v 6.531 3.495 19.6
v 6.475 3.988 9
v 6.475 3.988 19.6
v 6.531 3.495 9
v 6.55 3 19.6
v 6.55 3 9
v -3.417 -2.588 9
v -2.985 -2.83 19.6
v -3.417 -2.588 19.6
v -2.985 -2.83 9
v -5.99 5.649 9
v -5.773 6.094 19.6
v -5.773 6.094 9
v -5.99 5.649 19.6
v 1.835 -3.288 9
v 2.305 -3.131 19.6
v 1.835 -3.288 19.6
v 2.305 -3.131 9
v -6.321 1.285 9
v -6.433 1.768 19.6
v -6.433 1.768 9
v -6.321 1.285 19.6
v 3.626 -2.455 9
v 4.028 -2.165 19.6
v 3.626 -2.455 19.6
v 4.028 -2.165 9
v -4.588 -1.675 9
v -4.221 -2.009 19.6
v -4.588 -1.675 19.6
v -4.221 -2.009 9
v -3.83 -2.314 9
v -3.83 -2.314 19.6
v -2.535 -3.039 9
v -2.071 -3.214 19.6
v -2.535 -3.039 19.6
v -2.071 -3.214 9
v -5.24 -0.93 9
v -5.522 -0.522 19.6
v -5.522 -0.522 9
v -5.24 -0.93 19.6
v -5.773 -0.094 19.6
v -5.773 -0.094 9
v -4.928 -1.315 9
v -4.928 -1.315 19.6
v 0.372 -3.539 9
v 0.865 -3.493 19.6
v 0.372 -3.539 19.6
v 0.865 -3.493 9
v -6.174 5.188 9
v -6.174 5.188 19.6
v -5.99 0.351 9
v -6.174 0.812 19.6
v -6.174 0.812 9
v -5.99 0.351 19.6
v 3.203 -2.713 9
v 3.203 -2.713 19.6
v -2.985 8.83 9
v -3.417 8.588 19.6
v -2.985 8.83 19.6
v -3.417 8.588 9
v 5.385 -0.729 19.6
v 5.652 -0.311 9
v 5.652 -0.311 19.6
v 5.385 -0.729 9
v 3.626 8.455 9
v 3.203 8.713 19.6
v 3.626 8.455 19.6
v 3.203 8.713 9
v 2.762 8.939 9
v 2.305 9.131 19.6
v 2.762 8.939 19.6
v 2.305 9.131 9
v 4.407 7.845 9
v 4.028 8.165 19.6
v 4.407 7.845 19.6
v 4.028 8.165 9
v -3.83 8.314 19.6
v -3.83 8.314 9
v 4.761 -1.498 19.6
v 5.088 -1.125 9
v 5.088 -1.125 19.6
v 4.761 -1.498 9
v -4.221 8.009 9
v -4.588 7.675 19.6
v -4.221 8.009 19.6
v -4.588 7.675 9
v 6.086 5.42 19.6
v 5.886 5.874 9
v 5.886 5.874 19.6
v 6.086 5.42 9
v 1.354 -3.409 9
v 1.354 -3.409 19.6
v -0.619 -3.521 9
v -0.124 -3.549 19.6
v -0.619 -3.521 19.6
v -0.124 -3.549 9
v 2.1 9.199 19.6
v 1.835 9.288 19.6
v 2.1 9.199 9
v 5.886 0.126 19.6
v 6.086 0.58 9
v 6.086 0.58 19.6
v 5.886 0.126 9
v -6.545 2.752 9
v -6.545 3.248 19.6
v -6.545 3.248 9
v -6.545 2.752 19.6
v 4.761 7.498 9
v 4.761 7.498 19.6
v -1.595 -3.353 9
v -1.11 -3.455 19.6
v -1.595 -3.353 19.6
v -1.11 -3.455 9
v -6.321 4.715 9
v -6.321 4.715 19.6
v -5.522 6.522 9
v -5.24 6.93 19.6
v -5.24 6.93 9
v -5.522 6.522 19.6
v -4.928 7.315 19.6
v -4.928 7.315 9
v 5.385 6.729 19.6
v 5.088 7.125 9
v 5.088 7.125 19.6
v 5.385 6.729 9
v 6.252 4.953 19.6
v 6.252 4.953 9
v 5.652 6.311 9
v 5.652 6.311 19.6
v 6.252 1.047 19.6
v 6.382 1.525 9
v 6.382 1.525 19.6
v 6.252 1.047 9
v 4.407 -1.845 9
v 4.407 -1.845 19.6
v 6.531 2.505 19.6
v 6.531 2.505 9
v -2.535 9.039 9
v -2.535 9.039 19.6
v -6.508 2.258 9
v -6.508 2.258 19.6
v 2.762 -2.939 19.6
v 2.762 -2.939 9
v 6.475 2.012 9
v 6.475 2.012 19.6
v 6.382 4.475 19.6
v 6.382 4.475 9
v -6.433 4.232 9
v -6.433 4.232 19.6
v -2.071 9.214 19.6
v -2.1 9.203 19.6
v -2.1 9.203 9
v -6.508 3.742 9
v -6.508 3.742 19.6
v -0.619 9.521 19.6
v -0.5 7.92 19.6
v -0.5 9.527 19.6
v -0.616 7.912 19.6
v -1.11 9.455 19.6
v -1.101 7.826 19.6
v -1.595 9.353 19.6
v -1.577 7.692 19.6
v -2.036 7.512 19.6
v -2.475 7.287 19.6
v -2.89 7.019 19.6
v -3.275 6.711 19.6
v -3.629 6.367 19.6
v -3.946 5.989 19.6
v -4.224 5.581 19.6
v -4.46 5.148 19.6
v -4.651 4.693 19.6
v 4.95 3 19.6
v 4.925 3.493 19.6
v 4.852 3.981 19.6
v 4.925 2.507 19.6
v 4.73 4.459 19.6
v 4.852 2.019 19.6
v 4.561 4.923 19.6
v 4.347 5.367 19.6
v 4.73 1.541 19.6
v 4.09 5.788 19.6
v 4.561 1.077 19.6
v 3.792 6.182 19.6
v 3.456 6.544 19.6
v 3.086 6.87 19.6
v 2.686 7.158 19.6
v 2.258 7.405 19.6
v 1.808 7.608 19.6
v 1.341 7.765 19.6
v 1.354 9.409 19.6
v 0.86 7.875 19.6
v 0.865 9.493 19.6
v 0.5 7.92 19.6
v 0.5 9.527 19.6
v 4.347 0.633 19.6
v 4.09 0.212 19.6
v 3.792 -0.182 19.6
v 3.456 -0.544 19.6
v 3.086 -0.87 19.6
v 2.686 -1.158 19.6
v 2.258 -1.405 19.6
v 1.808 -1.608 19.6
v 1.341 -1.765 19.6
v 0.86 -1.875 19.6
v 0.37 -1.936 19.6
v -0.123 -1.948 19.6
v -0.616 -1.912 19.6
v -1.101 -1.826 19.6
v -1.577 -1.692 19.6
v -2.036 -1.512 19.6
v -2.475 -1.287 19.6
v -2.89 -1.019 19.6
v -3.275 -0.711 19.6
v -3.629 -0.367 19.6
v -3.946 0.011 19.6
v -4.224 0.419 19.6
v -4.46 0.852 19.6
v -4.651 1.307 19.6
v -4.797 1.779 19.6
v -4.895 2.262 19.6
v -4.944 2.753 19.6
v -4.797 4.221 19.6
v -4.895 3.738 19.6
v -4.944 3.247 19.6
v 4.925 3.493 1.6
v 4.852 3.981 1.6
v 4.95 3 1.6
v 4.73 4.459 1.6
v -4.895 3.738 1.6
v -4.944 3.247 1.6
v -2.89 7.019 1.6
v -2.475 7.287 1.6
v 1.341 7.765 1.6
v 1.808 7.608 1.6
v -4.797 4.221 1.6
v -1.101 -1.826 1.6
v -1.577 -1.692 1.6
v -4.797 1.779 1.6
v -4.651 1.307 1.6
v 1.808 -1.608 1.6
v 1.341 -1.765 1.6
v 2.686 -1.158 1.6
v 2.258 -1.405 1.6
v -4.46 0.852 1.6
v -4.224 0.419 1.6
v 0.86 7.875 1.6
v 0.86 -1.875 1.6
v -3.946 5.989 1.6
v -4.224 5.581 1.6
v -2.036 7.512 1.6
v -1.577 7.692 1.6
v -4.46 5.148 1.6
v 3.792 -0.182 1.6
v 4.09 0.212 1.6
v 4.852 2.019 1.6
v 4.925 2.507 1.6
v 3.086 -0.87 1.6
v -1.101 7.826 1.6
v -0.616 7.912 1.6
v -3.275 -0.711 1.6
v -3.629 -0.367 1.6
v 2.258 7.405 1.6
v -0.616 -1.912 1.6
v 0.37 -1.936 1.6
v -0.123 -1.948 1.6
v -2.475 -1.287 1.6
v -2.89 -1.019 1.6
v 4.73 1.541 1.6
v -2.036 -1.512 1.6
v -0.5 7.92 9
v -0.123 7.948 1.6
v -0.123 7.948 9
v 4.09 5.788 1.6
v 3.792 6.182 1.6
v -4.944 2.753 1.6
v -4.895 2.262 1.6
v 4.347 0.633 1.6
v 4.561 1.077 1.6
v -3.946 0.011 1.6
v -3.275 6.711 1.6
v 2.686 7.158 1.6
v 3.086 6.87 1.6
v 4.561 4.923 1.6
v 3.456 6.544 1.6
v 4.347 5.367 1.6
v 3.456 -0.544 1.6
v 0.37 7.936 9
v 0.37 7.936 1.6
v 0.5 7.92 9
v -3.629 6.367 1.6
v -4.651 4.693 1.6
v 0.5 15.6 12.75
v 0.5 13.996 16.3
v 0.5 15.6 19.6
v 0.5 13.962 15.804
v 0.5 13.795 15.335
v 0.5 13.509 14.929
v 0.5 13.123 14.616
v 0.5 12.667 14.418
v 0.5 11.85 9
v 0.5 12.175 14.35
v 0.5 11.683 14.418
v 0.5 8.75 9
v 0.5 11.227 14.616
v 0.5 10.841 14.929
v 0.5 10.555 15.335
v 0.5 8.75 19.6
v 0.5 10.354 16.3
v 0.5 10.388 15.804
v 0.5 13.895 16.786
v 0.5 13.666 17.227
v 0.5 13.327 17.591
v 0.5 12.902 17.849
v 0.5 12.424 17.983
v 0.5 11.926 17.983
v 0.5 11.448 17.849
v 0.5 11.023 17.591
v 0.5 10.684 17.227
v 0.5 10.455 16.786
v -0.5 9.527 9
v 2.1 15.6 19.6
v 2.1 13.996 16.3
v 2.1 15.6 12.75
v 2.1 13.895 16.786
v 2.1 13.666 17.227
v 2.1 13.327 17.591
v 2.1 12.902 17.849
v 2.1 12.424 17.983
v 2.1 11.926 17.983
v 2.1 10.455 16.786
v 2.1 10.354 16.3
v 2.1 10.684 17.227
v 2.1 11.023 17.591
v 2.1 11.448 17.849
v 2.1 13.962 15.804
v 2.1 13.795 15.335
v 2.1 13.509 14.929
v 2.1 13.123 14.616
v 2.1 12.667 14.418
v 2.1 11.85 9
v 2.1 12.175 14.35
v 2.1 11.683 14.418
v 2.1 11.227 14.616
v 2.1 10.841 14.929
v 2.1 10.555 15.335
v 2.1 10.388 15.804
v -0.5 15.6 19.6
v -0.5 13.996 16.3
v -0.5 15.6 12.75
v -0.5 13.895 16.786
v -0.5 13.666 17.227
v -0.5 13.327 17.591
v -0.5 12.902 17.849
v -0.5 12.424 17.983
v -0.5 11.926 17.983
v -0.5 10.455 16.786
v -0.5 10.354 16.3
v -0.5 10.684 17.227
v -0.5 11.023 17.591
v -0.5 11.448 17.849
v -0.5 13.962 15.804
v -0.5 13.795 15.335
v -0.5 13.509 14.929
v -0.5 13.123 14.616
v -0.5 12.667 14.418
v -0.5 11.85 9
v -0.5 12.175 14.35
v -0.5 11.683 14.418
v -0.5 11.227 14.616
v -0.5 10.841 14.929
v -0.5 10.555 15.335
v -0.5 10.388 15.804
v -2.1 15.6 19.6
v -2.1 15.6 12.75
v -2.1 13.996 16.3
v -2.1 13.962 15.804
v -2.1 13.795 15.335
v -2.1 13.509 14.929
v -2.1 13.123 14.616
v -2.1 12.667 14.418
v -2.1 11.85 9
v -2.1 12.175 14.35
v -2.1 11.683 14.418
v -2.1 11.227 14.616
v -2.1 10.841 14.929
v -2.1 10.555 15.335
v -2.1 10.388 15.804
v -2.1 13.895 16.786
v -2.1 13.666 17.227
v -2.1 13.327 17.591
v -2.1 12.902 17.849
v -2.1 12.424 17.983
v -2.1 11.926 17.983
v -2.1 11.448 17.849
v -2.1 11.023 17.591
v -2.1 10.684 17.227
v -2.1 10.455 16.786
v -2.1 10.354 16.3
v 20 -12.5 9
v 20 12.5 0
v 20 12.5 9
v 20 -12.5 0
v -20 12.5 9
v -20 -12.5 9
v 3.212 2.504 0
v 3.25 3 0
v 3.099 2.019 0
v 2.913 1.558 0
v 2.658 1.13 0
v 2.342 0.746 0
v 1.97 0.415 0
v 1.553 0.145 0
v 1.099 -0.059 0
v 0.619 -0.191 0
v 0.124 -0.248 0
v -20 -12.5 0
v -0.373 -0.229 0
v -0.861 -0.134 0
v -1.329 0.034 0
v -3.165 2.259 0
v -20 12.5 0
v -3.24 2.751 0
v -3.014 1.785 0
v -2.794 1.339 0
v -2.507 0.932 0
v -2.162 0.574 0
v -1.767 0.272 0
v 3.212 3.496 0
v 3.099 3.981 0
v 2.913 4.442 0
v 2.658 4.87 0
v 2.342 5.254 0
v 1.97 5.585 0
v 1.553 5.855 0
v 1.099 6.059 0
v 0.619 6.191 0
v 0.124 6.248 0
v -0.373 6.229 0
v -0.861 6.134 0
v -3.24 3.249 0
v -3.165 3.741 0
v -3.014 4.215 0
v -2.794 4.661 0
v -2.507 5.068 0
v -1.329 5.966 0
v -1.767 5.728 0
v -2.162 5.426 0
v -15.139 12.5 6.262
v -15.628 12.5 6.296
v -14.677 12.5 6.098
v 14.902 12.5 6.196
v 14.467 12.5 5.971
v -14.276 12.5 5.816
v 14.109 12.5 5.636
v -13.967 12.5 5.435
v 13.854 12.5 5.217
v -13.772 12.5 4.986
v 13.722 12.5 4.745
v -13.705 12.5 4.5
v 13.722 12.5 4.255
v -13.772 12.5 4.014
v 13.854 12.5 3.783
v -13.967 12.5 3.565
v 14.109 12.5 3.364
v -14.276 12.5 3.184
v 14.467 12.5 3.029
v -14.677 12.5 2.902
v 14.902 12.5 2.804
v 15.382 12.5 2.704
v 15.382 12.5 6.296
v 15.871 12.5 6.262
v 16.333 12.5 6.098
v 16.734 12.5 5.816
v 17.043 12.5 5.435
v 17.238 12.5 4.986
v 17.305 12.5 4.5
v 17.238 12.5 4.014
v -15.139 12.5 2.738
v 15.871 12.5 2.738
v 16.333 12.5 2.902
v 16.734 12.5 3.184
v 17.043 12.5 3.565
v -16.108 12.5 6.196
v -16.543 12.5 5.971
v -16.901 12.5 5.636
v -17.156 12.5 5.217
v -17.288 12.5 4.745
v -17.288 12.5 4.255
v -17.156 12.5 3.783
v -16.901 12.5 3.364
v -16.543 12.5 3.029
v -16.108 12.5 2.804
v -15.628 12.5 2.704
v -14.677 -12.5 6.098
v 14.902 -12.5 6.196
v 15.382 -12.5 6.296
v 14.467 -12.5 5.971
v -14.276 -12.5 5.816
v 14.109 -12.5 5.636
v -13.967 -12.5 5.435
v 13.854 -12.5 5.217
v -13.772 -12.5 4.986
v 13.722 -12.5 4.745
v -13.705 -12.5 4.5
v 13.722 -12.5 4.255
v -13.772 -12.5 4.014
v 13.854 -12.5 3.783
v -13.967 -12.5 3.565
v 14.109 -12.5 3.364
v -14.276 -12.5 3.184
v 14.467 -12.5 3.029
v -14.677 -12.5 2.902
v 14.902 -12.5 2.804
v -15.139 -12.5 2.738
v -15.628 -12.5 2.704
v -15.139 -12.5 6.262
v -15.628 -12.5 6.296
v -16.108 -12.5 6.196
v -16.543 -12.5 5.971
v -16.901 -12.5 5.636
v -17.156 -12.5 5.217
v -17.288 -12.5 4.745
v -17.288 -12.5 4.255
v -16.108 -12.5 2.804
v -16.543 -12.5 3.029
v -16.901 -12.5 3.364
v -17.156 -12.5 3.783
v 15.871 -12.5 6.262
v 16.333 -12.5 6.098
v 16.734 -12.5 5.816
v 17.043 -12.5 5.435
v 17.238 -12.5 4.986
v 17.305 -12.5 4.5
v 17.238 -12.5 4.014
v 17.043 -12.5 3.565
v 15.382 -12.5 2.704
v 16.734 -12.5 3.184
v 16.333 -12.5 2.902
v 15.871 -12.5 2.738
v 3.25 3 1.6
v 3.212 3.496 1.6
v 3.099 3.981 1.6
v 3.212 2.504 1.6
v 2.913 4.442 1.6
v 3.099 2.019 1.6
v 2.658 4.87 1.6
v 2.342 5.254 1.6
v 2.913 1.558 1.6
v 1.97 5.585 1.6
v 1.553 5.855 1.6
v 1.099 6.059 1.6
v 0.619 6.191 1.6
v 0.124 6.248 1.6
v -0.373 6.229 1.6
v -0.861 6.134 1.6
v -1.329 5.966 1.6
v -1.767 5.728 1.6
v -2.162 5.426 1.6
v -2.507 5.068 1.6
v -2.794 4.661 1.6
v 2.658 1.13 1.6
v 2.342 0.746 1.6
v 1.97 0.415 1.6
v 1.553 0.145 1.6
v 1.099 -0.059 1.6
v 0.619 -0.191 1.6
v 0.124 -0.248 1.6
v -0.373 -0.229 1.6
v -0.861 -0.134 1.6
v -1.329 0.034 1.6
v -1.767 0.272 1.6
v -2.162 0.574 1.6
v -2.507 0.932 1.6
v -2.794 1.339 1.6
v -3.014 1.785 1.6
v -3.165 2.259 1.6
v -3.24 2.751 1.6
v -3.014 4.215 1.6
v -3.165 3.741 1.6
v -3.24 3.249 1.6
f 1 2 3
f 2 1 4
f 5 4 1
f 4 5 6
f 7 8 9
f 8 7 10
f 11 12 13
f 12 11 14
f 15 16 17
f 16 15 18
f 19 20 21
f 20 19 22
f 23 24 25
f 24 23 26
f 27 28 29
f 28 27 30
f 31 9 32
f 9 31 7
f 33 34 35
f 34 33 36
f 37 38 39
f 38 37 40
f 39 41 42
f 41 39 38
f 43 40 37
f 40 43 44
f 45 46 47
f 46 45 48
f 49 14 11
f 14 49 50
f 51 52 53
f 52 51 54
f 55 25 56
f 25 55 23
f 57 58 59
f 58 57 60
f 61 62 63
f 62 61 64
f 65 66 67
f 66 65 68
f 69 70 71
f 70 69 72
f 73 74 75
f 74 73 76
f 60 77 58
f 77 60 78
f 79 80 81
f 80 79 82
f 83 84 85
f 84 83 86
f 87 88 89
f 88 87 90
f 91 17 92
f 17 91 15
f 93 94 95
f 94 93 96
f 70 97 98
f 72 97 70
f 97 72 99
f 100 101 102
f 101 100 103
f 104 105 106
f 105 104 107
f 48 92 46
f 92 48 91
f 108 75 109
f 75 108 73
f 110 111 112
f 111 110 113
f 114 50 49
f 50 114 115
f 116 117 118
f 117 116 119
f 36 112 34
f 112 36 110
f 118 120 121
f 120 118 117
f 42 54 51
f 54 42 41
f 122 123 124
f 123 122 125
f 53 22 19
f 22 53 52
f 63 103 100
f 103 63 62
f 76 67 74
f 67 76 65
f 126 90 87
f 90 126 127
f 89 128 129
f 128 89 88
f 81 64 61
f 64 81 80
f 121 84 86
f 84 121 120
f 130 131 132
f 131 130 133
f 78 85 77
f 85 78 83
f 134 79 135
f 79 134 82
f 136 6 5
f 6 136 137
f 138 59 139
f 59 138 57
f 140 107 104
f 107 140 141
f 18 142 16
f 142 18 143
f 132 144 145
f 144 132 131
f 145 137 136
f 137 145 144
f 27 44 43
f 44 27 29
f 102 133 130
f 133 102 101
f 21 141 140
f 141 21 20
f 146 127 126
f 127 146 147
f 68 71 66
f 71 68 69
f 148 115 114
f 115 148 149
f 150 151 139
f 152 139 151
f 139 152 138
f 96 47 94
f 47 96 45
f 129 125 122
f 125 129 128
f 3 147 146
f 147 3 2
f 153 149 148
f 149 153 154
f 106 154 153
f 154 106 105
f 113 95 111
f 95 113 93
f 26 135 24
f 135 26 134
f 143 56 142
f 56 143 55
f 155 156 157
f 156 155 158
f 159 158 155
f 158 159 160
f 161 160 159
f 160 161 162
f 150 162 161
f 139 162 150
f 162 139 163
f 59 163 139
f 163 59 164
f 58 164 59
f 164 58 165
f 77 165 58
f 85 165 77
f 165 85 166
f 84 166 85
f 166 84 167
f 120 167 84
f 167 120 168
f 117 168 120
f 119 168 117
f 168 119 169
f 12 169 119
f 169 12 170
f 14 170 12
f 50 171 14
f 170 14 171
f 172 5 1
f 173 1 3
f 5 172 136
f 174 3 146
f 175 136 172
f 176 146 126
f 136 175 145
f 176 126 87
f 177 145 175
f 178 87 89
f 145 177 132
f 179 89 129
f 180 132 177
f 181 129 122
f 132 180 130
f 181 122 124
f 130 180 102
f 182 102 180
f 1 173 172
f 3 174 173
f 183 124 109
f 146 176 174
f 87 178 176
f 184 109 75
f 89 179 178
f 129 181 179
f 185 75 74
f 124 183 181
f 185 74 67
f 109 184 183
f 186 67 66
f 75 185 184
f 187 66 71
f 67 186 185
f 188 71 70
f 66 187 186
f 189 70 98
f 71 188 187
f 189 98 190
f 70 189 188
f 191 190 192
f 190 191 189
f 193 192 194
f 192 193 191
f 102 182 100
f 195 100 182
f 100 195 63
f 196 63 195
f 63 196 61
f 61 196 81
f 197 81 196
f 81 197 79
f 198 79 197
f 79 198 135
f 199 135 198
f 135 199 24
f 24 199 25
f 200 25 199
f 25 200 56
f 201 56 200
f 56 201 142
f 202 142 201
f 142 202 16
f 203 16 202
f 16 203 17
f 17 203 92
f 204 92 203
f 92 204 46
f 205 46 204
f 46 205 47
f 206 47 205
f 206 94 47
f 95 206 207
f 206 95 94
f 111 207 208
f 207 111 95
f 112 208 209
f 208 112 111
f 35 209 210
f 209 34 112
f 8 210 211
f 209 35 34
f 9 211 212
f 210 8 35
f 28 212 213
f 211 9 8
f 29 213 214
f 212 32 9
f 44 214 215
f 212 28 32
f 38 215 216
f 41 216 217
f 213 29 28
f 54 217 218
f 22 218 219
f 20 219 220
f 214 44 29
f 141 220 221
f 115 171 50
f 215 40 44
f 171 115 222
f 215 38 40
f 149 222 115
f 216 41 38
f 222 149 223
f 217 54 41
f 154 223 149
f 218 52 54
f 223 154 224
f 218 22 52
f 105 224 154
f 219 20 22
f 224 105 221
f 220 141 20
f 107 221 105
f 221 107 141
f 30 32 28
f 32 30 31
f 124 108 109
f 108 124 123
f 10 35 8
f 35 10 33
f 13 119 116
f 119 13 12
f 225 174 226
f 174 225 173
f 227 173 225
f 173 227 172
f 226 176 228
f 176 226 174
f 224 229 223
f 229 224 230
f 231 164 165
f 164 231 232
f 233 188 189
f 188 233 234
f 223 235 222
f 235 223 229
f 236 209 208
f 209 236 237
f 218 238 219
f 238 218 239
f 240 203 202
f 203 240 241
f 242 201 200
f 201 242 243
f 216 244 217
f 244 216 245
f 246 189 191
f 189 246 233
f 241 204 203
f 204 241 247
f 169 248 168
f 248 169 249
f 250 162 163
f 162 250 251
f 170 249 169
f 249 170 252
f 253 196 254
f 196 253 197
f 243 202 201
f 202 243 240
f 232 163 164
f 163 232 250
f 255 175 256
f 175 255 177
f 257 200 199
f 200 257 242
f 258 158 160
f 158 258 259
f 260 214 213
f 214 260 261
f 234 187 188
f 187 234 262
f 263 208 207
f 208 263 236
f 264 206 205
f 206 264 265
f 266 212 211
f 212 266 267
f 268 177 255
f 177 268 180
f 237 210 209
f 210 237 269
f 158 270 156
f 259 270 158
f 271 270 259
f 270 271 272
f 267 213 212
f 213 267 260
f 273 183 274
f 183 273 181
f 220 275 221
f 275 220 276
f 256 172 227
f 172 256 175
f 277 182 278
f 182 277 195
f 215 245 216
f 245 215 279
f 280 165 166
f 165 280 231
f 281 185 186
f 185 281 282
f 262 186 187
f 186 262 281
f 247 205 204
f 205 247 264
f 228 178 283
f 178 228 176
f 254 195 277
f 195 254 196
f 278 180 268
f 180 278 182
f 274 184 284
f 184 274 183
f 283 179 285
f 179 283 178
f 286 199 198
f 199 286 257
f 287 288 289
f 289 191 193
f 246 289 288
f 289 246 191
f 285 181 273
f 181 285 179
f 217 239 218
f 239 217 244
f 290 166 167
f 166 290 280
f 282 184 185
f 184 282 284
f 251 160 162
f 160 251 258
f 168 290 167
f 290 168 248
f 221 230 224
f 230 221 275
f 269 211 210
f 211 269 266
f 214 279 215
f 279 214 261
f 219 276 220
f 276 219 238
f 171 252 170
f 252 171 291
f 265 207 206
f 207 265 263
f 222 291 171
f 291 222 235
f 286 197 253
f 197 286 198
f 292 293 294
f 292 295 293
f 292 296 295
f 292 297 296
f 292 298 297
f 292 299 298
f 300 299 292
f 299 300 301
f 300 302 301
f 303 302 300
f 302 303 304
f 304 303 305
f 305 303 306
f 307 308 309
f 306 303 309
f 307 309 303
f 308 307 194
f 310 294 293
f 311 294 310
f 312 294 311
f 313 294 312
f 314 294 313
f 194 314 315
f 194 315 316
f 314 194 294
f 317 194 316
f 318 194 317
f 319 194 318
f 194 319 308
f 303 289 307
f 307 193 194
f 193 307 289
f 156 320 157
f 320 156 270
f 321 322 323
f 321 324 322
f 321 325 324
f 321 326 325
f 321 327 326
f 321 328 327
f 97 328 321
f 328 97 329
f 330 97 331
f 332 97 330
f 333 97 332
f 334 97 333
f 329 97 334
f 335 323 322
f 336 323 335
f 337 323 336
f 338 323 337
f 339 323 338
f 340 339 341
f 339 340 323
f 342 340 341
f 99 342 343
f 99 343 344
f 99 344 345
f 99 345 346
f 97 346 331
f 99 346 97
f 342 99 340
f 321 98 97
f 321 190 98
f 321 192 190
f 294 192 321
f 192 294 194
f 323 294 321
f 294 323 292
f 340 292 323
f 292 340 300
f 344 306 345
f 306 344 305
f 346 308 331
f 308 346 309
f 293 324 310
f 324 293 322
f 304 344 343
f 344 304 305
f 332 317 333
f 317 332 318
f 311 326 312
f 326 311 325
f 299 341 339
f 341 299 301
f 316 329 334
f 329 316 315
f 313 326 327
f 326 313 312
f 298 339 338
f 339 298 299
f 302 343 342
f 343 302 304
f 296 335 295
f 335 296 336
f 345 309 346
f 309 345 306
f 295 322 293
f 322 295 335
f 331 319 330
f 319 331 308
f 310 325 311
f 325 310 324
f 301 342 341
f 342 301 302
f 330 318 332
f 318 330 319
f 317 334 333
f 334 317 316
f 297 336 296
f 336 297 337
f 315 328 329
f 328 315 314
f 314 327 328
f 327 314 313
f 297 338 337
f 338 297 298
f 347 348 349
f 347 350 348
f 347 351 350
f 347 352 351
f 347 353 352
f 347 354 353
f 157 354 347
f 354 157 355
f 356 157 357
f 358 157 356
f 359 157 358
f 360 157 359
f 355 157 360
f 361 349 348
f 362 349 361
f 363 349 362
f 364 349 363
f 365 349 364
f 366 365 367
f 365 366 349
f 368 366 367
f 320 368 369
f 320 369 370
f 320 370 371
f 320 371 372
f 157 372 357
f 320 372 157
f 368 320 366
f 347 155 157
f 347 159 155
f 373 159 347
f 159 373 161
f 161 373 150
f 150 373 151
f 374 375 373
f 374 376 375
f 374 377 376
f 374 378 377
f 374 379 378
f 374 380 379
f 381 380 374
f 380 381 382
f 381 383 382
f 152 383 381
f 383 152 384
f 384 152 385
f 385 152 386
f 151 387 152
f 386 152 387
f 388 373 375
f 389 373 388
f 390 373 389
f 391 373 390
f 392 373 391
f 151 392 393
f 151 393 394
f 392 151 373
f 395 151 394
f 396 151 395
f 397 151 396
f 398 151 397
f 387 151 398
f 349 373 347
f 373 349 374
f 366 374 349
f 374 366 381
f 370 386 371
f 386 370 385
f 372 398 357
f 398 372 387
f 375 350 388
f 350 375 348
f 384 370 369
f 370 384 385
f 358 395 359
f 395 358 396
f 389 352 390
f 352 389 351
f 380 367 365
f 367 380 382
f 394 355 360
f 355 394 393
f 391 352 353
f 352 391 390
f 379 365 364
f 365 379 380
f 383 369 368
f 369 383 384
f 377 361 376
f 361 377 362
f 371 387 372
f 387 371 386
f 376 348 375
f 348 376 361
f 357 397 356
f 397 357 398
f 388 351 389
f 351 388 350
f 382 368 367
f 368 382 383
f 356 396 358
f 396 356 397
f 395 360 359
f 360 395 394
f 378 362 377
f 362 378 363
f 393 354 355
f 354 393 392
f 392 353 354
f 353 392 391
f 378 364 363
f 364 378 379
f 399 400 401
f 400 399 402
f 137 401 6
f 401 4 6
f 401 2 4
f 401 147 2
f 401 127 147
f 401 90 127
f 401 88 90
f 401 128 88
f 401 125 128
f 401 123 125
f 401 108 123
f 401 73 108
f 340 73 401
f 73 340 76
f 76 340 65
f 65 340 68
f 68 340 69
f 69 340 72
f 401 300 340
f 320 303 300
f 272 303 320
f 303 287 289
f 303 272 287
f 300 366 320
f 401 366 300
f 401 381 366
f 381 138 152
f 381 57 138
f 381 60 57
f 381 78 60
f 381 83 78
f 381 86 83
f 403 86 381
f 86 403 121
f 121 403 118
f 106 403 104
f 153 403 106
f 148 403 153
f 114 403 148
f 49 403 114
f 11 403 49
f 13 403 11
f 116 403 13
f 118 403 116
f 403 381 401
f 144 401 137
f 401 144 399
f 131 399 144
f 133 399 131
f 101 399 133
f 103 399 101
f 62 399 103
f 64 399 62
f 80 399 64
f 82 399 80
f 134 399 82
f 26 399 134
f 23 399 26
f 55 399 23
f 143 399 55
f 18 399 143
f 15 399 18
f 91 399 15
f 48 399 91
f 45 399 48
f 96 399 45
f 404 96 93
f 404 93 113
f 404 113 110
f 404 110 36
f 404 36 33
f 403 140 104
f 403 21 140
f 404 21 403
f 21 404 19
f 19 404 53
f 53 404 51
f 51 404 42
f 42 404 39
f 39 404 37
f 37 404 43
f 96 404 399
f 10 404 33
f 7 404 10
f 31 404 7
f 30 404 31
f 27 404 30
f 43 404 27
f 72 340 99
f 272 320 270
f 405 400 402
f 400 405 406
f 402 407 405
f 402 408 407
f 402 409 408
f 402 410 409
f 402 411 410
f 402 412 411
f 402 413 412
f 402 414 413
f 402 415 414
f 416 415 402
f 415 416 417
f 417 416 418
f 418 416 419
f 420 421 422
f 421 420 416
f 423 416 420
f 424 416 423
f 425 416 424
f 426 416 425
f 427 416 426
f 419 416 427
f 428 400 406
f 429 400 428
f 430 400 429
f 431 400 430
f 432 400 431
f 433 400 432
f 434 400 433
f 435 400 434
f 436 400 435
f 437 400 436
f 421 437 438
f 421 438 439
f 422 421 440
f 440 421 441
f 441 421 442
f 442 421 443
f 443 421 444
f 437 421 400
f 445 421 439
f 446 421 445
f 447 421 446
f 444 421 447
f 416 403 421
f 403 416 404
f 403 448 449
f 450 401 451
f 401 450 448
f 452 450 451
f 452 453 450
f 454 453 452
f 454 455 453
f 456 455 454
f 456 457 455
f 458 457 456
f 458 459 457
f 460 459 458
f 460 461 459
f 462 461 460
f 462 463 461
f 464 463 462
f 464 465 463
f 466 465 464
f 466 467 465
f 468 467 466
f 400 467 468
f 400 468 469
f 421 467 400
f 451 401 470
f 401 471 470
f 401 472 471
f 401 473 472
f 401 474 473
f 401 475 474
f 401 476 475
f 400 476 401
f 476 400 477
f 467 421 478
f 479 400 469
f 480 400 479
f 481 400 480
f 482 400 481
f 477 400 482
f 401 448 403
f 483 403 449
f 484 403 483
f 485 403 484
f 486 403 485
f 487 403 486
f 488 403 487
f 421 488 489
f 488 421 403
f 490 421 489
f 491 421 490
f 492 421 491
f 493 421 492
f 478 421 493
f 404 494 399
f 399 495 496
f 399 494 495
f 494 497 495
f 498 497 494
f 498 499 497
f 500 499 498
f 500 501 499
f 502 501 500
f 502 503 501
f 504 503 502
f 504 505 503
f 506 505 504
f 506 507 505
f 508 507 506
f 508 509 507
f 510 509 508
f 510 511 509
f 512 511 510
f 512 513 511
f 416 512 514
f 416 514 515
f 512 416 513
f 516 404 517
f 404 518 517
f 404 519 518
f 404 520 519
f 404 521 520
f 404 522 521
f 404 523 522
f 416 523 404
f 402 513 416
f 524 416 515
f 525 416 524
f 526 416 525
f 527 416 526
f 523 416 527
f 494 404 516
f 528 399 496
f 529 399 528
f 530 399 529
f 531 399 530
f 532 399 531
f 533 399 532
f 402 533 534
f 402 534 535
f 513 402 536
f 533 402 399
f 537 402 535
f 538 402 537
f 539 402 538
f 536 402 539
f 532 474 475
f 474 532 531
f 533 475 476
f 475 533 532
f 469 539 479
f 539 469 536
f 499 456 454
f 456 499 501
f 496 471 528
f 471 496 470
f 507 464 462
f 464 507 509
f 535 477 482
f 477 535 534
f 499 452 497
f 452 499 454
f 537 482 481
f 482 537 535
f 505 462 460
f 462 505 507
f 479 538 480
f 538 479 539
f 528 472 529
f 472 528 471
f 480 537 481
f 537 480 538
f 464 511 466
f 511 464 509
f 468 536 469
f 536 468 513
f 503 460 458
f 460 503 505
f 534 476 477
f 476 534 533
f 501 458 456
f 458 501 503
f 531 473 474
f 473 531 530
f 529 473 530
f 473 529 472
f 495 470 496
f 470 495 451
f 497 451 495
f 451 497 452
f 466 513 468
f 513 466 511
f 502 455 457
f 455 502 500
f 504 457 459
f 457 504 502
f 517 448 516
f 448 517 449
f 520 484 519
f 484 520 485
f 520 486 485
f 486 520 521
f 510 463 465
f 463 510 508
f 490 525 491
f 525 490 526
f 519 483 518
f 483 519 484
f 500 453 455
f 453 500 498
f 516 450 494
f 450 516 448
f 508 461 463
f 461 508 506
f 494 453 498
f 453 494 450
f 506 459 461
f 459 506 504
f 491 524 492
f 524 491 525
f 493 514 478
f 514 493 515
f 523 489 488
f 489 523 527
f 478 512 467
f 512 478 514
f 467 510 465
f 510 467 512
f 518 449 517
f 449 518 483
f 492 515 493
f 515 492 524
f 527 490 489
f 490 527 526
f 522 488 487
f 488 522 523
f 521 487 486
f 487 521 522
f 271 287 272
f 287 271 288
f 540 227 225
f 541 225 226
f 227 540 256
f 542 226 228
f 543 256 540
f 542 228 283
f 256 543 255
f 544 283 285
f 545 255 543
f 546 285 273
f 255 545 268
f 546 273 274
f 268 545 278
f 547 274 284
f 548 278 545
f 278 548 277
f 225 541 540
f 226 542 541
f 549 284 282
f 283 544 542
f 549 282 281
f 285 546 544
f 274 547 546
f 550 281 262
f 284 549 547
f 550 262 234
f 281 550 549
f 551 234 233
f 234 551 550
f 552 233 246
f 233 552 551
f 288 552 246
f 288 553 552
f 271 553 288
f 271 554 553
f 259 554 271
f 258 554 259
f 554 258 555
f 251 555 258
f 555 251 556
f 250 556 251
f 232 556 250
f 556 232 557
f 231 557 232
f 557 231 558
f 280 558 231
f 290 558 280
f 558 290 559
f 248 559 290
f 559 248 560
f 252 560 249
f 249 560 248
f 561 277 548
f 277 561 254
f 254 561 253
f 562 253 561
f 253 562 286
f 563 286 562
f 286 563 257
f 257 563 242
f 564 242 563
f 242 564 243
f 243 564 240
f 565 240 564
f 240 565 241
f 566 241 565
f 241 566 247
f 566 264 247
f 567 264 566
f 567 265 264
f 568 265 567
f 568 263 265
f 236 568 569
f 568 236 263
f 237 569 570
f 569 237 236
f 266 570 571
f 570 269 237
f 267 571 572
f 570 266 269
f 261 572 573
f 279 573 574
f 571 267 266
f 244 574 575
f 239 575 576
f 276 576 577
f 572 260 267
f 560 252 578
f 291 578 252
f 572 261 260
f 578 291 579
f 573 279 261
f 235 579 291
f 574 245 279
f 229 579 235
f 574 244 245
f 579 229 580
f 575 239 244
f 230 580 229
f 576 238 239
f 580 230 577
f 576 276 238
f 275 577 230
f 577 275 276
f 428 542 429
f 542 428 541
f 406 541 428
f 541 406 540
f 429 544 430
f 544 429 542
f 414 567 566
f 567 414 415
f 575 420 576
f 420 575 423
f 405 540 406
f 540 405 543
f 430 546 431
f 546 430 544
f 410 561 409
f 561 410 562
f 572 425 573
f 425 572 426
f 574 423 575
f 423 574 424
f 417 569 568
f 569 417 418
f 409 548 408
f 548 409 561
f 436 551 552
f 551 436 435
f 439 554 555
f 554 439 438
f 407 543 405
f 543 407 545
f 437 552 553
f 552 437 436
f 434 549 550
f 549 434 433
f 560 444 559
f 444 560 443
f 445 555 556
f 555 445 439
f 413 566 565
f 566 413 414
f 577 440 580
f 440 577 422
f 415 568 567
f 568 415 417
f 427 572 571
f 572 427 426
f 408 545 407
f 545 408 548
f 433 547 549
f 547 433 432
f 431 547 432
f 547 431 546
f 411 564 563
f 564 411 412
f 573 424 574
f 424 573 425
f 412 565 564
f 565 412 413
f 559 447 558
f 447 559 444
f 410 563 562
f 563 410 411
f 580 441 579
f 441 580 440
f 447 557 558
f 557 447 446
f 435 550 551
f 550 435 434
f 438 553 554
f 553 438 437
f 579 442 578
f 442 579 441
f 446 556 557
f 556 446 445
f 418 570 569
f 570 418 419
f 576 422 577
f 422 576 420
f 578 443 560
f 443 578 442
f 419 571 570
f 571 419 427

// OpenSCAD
// [FL_INDEX: keywords="openscad, 3d_parametric, Customizable_Dial_Indicator_Mount_for_Stepstruder, csg_solid" | COT="Parametric OpenSCAD design from 3DCodeverse"]
// Title: Customizable Dial Indicator Mount for Stepstruder

//design and code by emanresu (http://www.thingiverse.com/Emanresu)
//dial indicator mount for a makerbot step-struder mk7

use <./MCAD/3d_triangle.scad>

// preview[view:east, tilt:top]


//CUSTOMIZER VARIABLES

//diameter of the sensor arm of the dial indicator (mm)
indicator_sensor_diameter=6.5;
//diameter of the mounting shaft of the dial indicator (mm)
indicator_mount_diameter = 9.9;
//length of the mounting shaft of the dial indicator (mm)
mount_depth = 18;
//diameter of clamping bolt (mm)
bolt_diameter=3.65;
//width of mounting block (mm)
block_width = 25; 
//offset of clamp along the center of the mounting block (mm)
offset = 3;  


/* [Hidden] */

//sets openSCAD resolution
$fa=1;
$fs=0.5;

//Clamp parameters
thick = 1.6;//thickness of clamp, bottom of clamp
gap = 1;//gap between tightening tabs on clamp

indicator_sensor_radius=indicator_sensor_diameter/2; //radius of the dial indicator's sensor shaft
indicator_mount_radius = indicator_mount_diameter/2;//radius of dial indicator's mounting shaft

//mounting block dimentions
//y dimention controled by block_with above
bm_x = 40; //width of stepstruder bar mount
bm_z = 9; //thickness of stepstruder bar mount

//mounting block holes (to line up with the stepstruder bar mount)
bm_hole_offset = 31.01/2; //how far the holes are from the center of the mounting block NEMA 17
bm_hole_diameter = 3.6;  //M3 bolt clearance hole diameter
bm_hole_radius = bm_hole_diameter/2;  //M3 bolt clearance hole radius

bolt_radius=bolt_diameter/2;//radius of tightening bolt


  /////////////
 // Modules //
/////////////

module DI_clamp() {
	//generates the dial indicator clamp, puts everything together
	union() {
		translate([0, offset, thick]) {
			clamp_cyl();
		}
		translate([0, 0, bm_z/2]) {
			difference() {
				mounting_block();
				translate([0, offset, thick]) {
					cylinder(r=indicator_mount_radius, h=bm_z, center=true);
				}
				translate([0, offset, 0]) {
					cylinder(r=indicator_sensor_radius, h=bm_z+1, center=true);
				}
			}	
		}	
	}
}

module mounting_block() {
	// generates the mounting block with holes to mount to a mk7 stepstruder
	difference() {
		cube(size=[bm_x, block_width, bm_z], center=true);
		translate([bm_hole_offset, 0, 0]) {
			rotate([90, 0, 0]) {
				cylinder(r=bm_hole_radius, h=block_width+1, center=true);
			}
		}
		translate([-bm_hole_offset, 0, 0]) {
			rotate([90, 0, 0]) {
				cylinder(r=bm_hole_radius, h=block_width+1, center=true);
			}
		}
	}
}

module clamp_cyl() {
	//makes a cylindric clamp with screw tabs to tighten it
	//radius determines the internal radius
	//depth determines the height
	//thick determines how thick it is, difference between external and internal radius
	//gap determines how large the gap in the clamp is
	union() {
		difference() {
			cylinder(r=indicator_mount_radius+thick, h=mount_depth, center=false);
			translate([0, 0, -0.5]) {
				cylinder(r=indicator_mount_radius, h=mount_depth+1, center=false);
			}
			translate([-gap/2, 0, -0.5]) {
				cube(size=[gap, indicator_mount_radius+thick, mount_depth+1], center=false);
			}
		}
		translate([gap/2, indicator_mount_radius+thick/2, mount_depth-(2*bolt_radius+2*thick)]) {
			screw_tab();
		}

		translate([-gap/2-thick, indicator_mount_radius+thick/2, mount_depth-(2*bolt_radius+2*thick)]) {
			screw_tab();
		}	
	}	
}

module screw_tab() {
	//makes the screw tabs on the clamp
	//square tabs with triangular bottoms
	//rad determines the radius of the screw holes
	//thick determines how thick the tabs are
	difference() {
		union() {
			cube(size=[thick, 2*bolt_radius+2*thick, 2*bolt_radius+2*thick], center=false);
			rotate([0, 90, 0]) {
				3dtri_draw([0,0,0],[0,2*bolt_radius+2*thick,0],[2*bolt_radius+2*thick,0,0],thick);
			}
		}
		translate([-0.5, (2*bolt_radius+2*thick)/2, (2*bolt_radius+2*thick)/2]) {
			rotate([0, 90, 0]) {
				cylinder(r=bolt_radius, h=thick+1, center=false);
			}
		}
	}	
}


  //////////////////
 // Control Code //
//////////////////

DI_clamp();
